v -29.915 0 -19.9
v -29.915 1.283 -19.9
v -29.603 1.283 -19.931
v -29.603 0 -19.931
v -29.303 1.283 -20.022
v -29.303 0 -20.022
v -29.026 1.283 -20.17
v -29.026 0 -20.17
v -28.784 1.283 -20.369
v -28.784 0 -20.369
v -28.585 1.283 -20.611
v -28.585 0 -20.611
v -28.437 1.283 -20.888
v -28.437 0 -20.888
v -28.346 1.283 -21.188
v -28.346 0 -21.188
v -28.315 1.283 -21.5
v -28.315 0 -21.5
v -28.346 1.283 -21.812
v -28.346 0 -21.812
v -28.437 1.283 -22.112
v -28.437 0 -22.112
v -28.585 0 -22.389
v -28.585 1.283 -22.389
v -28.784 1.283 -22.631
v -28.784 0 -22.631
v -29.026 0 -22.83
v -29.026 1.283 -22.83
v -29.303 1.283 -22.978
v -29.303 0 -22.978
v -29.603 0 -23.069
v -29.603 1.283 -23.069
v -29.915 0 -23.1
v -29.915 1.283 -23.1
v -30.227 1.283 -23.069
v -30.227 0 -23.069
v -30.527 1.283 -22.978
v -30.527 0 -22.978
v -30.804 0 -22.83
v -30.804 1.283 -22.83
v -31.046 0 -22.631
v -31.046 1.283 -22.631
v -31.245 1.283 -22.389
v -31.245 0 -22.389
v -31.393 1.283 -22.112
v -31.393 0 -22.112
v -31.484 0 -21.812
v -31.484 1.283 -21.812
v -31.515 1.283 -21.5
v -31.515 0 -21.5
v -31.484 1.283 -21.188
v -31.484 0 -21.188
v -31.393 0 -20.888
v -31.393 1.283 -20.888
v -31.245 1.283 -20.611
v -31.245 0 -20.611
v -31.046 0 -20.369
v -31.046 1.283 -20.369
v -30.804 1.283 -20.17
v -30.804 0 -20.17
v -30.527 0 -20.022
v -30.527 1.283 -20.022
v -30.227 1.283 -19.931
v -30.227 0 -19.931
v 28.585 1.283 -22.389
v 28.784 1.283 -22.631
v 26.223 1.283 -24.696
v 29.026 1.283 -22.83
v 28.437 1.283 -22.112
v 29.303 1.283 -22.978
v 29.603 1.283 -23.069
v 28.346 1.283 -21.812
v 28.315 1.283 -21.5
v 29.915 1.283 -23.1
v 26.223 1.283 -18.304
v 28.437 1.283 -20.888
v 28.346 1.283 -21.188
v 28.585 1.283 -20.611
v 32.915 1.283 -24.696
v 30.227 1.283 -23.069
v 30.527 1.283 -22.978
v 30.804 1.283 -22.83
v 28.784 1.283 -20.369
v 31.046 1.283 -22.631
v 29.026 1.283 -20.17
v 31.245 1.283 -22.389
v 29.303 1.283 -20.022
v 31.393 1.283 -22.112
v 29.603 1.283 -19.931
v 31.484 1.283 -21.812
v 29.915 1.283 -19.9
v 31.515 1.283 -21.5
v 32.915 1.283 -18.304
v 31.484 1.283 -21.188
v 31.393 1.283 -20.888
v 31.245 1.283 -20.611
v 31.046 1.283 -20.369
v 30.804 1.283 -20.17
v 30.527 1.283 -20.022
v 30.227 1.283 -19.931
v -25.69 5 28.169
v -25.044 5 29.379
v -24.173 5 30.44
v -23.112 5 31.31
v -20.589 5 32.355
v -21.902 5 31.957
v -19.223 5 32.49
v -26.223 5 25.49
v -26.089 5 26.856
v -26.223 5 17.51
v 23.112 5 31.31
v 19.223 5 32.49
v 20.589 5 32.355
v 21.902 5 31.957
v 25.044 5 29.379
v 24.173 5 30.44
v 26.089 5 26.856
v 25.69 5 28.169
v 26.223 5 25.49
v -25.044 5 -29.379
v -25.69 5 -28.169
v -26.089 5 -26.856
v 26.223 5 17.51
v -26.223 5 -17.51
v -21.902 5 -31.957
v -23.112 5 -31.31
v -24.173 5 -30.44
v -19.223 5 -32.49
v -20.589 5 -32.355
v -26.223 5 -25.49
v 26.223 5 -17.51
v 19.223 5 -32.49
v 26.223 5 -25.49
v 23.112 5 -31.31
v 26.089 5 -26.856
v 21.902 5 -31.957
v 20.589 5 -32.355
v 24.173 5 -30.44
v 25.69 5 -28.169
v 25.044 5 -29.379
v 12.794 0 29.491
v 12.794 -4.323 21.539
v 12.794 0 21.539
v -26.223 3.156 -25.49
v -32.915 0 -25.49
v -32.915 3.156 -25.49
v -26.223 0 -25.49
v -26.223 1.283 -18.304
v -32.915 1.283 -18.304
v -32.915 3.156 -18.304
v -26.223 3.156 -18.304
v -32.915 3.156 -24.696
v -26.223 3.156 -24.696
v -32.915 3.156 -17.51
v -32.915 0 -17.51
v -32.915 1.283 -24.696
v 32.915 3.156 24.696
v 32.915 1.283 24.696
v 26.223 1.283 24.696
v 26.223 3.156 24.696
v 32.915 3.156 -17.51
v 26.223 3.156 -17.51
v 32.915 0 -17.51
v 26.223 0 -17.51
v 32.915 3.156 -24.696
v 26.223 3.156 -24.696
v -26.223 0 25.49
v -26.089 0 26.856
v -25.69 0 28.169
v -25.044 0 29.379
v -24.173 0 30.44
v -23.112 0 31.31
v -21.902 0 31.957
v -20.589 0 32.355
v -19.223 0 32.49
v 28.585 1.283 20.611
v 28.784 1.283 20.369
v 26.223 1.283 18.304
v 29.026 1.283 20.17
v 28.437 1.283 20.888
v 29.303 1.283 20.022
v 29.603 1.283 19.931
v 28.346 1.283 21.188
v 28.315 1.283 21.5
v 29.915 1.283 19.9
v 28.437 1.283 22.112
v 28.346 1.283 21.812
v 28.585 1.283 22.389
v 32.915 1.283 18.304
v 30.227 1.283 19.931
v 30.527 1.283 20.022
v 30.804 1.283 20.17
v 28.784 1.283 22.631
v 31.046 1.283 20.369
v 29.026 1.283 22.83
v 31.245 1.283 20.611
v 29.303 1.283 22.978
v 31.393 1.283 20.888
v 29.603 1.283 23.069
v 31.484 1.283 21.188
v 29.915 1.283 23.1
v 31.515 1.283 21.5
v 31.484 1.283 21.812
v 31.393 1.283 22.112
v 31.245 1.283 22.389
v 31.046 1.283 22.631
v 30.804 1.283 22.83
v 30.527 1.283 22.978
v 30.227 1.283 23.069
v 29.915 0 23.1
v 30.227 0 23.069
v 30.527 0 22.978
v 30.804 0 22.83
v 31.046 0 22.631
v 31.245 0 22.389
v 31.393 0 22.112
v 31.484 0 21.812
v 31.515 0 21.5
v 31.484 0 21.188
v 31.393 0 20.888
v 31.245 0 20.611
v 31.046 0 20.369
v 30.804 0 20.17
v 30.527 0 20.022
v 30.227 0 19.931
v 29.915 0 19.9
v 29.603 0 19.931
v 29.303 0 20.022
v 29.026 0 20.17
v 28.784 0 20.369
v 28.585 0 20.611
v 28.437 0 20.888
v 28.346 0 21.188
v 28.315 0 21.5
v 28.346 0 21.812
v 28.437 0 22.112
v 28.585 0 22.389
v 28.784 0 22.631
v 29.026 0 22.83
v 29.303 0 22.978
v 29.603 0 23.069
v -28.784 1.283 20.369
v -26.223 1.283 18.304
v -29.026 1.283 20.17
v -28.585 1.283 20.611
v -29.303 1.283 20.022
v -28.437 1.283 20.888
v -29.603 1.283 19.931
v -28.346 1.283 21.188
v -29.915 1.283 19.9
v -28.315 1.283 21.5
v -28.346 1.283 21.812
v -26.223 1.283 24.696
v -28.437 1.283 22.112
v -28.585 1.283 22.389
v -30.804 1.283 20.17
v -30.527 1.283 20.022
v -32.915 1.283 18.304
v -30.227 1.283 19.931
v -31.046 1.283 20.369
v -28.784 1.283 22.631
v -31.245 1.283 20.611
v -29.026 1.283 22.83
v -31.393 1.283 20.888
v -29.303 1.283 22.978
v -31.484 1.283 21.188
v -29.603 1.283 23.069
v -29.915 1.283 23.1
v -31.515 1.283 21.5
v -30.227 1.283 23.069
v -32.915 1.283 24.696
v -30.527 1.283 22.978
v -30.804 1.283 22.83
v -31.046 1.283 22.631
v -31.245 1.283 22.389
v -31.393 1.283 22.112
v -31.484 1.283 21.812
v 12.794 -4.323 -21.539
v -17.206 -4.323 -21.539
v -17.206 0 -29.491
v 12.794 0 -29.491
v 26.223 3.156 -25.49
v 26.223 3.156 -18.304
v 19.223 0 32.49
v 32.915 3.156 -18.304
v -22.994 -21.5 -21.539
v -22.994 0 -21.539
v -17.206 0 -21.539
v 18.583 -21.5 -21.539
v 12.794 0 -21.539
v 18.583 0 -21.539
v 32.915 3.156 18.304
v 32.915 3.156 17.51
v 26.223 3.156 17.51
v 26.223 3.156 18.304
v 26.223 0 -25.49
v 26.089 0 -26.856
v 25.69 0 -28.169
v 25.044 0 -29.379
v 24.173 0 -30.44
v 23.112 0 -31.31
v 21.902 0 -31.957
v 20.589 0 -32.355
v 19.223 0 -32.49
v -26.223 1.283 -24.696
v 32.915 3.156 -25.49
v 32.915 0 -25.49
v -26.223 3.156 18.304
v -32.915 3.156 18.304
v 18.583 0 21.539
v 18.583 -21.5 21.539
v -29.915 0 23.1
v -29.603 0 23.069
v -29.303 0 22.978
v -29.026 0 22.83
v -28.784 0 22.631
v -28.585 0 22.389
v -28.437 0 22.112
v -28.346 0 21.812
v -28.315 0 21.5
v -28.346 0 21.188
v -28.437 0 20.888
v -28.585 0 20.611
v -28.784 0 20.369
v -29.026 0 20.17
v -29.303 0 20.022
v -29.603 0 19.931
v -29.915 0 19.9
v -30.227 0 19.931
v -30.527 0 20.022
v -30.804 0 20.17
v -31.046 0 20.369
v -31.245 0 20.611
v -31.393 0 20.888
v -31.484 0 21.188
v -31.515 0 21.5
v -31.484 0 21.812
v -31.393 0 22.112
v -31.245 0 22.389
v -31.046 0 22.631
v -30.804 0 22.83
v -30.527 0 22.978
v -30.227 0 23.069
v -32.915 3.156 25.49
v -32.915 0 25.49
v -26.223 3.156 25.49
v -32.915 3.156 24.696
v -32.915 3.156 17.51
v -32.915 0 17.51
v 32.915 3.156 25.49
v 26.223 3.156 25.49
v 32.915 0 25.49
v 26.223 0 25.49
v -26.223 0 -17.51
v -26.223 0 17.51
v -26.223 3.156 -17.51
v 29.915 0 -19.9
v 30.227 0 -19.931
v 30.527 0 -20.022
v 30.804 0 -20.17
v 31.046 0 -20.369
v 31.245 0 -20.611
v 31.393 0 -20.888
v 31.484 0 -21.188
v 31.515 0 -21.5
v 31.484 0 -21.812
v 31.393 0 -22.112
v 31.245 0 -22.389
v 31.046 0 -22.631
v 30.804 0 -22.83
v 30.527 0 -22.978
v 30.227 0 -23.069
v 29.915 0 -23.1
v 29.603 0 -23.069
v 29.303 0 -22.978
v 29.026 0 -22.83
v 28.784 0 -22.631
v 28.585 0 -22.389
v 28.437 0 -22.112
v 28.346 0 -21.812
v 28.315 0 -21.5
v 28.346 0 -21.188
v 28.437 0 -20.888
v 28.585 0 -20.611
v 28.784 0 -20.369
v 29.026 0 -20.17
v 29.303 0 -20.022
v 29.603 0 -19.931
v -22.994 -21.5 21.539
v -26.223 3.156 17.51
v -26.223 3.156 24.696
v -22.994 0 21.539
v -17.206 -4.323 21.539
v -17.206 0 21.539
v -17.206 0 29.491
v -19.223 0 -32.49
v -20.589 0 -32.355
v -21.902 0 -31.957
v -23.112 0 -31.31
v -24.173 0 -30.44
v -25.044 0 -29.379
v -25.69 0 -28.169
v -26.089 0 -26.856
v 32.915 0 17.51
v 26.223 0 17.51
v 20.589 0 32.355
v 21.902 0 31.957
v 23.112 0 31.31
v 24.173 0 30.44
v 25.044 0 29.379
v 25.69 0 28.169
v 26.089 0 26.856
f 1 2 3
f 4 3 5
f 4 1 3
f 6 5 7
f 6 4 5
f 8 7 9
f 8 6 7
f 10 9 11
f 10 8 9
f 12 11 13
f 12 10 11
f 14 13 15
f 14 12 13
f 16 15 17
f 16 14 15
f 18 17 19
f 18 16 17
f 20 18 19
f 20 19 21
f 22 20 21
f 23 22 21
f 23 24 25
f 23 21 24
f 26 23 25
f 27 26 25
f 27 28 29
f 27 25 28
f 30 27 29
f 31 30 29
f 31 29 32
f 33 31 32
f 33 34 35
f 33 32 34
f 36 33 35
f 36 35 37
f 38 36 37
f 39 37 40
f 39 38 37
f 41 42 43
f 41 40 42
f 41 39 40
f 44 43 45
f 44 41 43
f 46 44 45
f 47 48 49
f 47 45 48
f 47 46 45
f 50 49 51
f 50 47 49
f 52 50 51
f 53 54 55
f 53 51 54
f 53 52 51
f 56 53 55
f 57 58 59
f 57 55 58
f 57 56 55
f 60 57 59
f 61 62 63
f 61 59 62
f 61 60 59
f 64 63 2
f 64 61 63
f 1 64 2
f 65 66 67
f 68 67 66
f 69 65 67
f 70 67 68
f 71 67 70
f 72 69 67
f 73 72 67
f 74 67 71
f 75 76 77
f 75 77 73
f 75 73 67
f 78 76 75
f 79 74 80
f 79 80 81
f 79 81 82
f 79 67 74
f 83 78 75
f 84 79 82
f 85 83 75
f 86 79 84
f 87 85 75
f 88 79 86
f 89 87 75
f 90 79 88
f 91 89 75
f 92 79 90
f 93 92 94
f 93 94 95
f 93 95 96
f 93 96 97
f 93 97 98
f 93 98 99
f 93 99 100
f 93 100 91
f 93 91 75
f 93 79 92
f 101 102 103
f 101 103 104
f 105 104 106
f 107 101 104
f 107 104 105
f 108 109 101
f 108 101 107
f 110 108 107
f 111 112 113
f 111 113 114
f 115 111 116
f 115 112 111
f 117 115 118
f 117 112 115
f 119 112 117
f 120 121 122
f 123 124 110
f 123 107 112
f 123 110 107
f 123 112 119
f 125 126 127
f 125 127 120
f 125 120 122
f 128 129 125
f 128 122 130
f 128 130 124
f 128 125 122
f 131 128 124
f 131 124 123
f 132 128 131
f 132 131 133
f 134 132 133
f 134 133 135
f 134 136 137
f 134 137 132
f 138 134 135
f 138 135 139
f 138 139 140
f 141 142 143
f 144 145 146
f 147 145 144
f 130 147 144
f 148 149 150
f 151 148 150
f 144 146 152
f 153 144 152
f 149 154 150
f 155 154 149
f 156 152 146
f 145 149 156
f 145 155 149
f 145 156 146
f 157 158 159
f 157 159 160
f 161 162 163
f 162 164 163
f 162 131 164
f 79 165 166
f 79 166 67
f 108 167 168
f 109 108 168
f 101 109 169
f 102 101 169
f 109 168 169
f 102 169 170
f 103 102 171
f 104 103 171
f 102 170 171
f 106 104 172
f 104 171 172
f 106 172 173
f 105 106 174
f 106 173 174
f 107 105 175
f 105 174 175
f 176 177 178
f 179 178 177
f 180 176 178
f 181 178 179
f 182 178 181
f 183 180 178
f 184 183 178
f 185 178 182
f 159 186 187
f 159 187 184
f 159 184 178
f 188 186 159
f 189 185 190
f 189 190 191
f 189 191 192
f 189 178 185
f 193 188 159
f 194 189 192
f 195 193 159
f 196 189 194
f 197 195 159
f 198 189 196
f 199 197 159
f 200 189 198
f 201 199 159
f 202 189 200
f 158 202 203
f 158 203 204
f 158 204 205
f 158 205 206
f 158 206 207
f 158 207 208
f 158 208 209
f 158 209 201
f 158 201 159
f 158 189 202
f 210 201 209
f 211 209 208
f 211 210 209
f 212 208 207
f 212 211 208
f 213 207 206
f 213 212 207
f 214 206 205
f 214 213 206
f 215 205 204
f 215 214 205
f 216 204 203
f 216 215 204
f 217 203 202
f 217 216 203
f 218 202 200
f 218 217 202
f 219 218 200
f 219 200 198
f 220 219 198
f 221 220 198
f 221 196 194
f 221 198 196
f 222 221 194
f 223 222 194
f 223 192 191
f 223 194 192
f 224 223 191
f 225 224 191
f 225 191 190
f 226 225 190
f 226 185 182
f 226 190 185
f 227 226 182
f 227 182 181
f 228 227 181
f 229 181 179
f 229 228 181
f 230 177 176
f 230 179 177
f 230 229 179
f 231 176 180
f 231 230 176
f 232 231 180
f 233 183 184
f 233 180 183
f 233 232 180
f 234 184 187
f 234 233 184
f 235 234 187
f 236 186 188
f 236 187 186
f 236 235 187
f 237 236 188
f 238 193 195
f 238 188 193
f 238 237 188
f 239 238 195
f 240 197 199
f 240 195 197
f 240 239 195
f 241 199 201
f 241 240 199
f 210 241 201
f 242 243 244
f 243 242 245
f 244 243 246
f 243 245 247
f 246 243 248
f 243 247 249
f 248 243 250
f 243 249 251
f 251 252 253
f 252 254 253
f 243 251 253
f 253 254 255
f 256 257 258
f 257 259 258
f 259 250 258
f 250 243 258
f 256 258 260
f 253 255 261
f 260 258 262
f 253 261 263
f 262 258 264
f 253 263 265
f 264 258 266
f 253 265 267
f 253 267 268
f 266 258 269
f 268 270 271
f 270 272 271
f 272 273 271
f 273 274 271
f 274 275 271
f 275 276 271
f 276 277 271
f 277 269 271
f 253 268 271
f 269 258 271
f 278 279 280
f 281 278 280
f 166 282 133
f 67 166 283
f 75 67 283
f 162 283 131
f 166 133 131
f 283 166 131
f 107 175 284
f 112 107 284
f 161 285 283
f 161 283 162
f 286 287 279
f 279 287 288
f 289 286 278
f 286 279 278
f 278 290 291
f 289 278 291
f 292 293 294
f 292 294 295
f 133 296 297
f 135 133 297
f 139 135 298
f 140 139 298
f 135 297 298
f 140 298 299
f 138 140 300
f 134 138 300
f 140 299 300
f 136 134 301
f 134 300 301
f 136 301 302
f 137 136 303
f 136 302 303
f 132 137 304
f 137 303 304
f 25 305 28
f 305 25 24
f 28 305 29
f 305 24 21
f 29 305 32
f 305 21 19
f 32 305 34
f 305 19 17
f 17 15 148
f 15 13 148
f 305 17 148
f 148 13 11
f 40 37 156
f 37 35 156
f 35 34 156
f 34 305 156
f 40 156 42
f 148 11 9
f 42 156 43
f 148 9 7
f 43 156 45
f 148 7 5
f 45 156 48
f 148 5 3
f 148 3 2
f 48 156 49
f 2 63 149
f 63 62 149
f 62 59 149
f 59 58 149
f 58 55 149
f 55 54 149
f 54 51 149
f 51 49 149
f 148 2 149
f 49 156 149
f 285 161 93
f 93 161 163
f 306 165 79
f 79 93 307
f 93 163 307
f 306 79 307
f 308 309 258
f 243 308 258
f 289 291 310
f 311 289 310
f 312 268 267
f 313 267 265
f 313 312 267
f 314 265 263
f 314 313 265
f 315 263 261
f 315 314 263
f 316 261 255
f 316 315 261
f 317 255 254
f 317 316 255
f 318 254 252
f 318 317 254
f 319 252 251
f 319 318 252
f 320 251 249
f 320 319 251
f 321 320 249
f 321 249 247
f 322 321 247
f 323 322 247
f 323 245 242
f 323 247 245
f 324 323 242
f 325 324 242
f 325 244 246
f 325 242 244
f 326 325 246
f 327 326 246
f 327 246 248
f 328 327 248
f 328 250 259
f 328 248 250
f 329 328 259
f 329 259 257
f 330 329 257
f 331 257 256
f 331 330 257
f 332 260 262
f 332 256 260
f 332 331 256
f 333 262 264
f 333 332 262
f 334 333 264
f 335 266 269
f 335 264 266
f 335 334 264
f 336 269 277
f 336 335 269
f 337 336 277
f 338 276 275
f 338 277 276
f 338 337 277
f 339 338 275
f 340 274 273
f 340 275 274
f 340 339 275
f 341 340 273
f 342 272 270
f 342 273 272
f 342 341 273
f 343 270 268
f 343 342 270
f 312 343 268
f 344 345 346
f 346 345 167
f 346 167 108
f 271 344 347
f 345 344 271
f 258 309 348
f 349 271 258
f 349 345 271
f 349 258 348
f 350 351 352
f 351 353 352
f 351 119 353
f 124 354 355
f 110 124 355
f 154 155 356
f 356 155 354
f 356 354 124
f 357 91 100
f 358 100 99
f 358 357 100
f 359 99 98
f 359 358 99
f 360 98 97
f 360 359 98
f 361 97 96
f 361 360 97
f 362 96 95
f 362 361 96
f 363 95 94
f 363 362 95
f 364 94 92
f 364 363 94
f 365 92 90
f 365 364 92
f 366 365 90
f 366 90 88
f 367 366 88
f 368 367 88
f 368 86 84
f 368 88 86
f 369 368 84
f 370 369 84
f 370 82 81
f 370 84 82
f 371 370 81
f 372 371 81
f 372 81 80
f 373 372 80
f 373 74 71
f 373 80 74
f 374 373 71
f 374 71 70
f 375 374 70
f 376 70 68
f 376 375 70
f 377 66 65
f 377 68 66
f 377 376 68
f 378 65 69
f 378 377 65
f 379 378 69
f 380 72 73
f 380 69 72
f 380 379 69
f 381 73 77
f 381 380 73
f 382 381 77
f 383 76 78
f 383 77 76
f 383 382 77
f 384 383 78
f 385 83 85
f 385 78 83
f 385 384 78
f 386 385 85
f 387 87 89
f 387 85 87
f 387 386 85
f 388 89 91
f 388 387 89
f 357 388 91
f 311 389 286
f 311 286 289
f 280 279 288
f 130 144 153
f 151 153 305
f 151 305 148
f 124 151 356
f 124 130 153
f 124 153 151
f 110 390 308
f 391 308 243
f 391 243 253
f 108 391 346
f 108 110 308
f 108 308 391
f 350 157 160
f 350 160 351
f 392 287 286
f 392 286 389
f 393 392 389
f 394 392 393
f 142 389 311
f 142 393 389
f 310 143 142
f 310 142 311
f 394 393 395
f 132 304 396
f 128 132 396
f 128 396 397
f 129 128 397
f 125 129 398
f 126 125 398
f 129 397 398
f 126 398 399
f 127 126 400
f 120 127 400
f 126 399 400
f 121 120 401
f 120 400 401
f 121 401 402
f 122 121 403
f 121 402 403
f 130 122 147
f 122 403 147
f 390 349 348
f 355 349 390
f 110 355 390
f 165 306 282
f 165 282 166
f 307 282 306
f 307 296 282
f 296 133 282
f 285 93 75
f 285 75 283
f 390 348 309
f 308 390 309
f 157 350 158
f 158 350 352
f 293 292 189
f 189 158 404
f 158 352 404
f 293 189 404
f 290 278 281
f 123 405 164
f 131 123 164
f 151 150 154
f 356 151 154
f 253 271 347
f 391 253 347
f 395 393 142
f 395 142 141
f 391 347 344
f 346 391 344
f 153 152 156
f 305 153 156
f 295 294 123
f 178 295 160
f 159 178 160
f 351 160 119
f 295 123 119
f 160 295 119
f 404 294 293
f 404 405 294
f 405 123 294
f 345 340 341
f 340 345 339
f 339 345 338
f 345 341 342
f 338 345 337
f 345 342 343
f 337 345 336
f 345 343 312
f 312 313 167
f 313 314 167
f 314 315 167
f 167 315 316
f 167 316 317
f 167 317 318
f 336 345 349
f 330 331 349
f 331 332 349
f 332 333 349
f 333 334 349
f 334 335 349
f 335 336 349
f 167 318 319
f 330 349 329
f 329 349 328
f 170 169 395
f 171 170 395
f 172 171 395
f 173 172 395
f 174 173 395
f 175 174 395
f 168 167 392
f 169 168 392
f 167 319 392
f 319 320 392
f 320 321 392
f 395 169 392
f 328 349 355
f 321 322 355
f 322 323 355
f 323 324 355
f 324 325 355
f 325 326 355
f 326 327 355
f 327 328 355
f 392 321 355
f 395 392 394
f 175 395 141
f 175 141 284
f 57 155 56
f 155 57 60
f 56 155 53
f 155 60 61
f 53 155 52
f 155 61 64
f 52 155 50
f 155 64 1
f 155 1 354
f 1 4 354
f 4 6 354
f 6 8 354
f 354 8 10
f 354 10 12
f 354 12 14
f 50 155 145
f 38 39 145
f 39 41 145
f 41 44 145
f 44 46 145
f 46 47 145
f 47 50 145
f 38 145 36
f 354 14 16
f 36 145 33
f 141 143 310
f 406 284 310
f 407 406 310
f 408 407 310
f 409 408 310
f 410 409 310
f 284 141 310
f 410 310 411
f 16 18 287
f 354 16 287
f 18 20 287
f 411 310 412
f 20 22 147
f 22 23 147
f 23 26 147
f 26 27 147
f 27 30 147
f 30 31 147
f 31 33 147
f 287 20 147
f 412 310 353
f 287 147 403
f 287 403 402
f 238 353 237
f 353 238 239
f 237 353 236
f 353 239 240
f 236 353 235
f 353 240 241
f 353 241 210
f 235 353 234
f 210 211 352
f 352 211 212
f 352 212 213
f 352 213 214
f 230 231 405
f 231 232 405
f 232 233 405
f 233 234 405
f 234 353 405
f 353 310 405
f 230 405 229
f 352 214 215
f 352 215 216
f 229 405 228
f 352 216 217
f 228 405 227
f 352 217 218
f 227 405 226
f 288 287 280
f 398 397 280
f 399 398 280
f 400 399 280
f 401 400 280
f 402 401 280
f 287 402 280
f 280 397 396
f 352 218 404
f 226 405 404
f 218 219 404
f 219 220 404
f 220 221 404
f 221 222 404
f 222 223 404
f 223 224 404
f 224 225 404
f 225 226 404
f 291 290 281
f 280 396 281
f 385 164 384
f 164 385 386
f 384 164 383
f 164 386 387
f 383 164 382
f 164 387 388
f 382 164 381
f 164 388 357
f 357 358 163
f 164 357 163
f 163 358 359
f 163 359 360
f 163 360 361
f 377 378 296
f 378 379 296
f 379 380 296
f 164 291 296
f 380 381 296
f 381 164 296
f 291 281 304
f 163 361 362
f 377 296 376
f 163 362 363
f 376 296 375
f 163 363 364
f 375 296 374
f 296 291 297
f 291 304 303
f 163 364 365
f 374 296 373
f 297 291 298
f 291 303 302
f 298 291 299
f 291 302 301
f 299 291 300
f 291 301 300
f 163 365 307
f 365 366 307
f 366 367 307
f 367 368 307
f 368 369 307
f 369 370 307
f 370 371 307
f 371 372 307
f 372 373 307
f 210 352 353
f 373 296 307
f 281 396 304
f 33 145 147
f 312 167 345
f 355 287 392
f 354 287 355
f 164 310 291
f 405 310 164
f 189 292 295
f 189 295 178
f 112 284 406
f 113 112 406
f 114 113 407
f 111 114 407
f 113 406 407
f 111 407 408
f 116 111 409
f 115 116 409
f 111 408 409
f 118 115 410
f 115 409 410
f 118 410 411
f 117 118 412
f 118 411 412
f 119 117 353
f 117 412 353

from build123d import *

# Parameters (mm, degrees)
SKETCH1_W           = 6.691688341
SKETCH1_H           = 7.98
SKETCH1_R           = 1.6
BOSS_EXTRUDE1_DEPTH = 5
SKETCH2_W           = 41.577195194
SKETCH2_H           = 43.078854614
BOSS_EXTRUDE2_DEPTH = 21.5
CUT_EXTRUDE1_DEPTH  = 6.691688
CUT_EXTRUDE2_START  = -65.83
CUT_EXTRUDE2_DEPTH  = 6.691688
RIB2_REACH          = 54.453
SKETCH4_WALL_W      = 115.956406408
SKETCH4_WALL_H      = 30


with BuildPart() as part:
    # Sketch1 → Boss-Extrude1 (new body)
    # profile 1 of 5: a face of its own
    with BuildSketch(Plane(origin=(0, 0, 0), x_dir=(1, 0, 0), z_dir=(0, 1, 0))):
        with Locations((-29.569155829, 21.5)):
            Rectangle(SKETCH1_W, SKETCH1_H)
        with Locations(Location((-29.915, 21.5, 0), (0, 0, 270))):
            Circle(SKETCH1_R, mode=Mode.SUBTRACT)
    # profile 2 of 5: a face of its own
    with BuildSketch(Plane(origin=(0, 0, 0), x_dir=(1, 0, 0), z_dir=(0, 1, 0))):
        with Locations((-29.569155829, -21.5)):
            Rectangle(SKETCH1_W, SKETCH1_H)
        with Locations(Location((-29.915, -21.5, 0), (0, 0, 270))):
            Circle(SKETCH1_R, mode=Mode.SUBTRACT)
    # profile 3 of 5: a face of its own
    with BuildSketch(Plane(origin=(0, 0, 0), x_dir=(1, 0, 0), z_dir=(0, 1, 0))):
        with BuildLine():
            Line((-26.223311659, 25.49), (-26.223311659, 17.51))
            Line((-26.223311659, 17.51), (-26.223311659, -17.51))
            Line((-26.223311659, -17.51), (-26.223311659, -25.49))
            ThreePointArc((-26.223311659, -25.49), (-24.173059128, -30.439747468), (-19.223311659, -32.49))
            Line((-19.223311659, -32.49), (19.223311659, -32.49))
            ThreePointArc((19.223311659, -32.49), (24.173059128, -30.439747468), (26.223311659, -25.49))
            Line((26.223311659, -25.49), (26.223311659, -17.51))
            Line((26.223311659, -17.51), (26.223311659, 17.51))
            Line((26.223311659, 17.51), (26.223311659, 25.49))
            ThreePointArc((26.223311659, 25.49), (24.173059128, 30.439747468), (19.223311659, 32.49))
            Line((19.223311659, 32.49), (-19.223311659, 32.49))
            ThreePointArc((-19.223311659, 32.49), (-24.173059128, 30.439747468), (-26.223311659, 25.49))
        make_face()
    # profile 4 of 5: a face of its own
    with BuildSketch(Plane(origin=(0, 0, 0), x_dir=(1, 0, 0), z_dir=(0, 1, 0))):
        with Locations((29.569155829, 21.5)):
            Rectangle(SKETCH1_W, SKETCH1_H)
        with Locations(Location((29.915, 21.5, 0), (0, 0, 270))):
            Circle(SKETCH1_R, mode=Mode.SUBTRACT)
    # profile 5 of 5: a face of its own
    with BuildSketch(Plane(origin=(0, 0, 0), x_dir=(1, 0, 0), z_dir=(0, 1, 0))):
        with Locations((29.569155829, -21.5)):
            Rectangle(SKETCH1_W, SKETCH1_H)
        with Locations(Location((29.915, -21.5, 0), (0, 0, 270))):
            Circle(SKETCH1_R, mode=Mode.SUBTRACT)
    extrude(amount=BOSS_EXTRUDE1_DEPTH)

    # Sketch2 → Boss-Extrude2 (add)
    with BuildSketch(Plane.XZ):
        with Locations((-2.205562273, 0)):
            Rectangle(SKETCH2_W, SKETCH2_H)
    extrude(amount=BOSS_EXTRUDE2_DEPTH)

    # Sketch3 → Cut-Extrude1 (cut)
    with BuildSketch(Plane.ZY.offset(32.915)):
        Polygon((-18.304058028, 3.156143774), (-17.51, 3.156143774), (-17.51, 5), (-25.49, 5), (-25.49, 3.156143774), (-24.695941972, 3.156143774), (-24.695941972, 1.28299036), (-18.304058028, 1.28299036), align=None)
        Polygon((24.695941972, 3.156143774), (25.49, 3.156143774), (25.49, 5), (17.51, 5), (17.51, 3.156143774), (18.304058028, 3.156143774), (18.304058028, 1.28299036), (24.695941972, 1.28299036), align=None)
    extrude(amount=-CUT_EXTRUDE1_DEPTH, mode=Mode.SUBTRACT)

    # Sketch3<3> → Cut-Extrude2 (cut)
    with BuildSketch(Plane.ZY.offset(32.915).offset(CUT_EXTRUDE2_START)):
        Polygon((24.695941972, 3.156143774), (25.49, 3.156143774), (25.49, 5), (17.51, 5), (17.51, 3.156143774), (18.304058028, 3.156143774), (18.304058028, 1.28299036), (24.695941972, 1.28299036), align=None)
        Polygon((-18.304058028, 3.156143774), (-17.51, 3.156143774), (-17.51, 5), (-25.49, 5), (-25.49, 3.156143774), (-24.695941972, 3.156143774), (-24.695941972, 1.28299036), (-18.304058028, 1.28299036), align=None)
    extrude(amount=CUT_EXTRUDE2_DEPTH, mode=Mode.SUBTRACT)

    # Sketch4 wall → Rib2 (add, up to next)
    with BuildSketch(Plane(origin=(-2.205562273, -2.161622642, -25.515102301), x_dir=(0, 0.477671912918, -0.878538299455), z_dir=(0, 0.878538299455, 0.477671912918)), mode=Mode.PRIVATE) as rib2_sk1:
        Rectangle(SKETCH4_WALL_W, SKETCH4_WALL_H)
    rib2_tool1 = extrude(rib2_sk1.sketch, amount=RIB2_REACH, mode=Mode.PRIVATE) - part.part
    rib2 = rib2_tool1.solids().sort_by_distance((-2.205562273, -2.161622642, -25.515102301))[0]
    add(rib2)

    # Mirror4: Rib2 across plane
    add(rib2.mirror(Plane.XY))


solid = part.part
